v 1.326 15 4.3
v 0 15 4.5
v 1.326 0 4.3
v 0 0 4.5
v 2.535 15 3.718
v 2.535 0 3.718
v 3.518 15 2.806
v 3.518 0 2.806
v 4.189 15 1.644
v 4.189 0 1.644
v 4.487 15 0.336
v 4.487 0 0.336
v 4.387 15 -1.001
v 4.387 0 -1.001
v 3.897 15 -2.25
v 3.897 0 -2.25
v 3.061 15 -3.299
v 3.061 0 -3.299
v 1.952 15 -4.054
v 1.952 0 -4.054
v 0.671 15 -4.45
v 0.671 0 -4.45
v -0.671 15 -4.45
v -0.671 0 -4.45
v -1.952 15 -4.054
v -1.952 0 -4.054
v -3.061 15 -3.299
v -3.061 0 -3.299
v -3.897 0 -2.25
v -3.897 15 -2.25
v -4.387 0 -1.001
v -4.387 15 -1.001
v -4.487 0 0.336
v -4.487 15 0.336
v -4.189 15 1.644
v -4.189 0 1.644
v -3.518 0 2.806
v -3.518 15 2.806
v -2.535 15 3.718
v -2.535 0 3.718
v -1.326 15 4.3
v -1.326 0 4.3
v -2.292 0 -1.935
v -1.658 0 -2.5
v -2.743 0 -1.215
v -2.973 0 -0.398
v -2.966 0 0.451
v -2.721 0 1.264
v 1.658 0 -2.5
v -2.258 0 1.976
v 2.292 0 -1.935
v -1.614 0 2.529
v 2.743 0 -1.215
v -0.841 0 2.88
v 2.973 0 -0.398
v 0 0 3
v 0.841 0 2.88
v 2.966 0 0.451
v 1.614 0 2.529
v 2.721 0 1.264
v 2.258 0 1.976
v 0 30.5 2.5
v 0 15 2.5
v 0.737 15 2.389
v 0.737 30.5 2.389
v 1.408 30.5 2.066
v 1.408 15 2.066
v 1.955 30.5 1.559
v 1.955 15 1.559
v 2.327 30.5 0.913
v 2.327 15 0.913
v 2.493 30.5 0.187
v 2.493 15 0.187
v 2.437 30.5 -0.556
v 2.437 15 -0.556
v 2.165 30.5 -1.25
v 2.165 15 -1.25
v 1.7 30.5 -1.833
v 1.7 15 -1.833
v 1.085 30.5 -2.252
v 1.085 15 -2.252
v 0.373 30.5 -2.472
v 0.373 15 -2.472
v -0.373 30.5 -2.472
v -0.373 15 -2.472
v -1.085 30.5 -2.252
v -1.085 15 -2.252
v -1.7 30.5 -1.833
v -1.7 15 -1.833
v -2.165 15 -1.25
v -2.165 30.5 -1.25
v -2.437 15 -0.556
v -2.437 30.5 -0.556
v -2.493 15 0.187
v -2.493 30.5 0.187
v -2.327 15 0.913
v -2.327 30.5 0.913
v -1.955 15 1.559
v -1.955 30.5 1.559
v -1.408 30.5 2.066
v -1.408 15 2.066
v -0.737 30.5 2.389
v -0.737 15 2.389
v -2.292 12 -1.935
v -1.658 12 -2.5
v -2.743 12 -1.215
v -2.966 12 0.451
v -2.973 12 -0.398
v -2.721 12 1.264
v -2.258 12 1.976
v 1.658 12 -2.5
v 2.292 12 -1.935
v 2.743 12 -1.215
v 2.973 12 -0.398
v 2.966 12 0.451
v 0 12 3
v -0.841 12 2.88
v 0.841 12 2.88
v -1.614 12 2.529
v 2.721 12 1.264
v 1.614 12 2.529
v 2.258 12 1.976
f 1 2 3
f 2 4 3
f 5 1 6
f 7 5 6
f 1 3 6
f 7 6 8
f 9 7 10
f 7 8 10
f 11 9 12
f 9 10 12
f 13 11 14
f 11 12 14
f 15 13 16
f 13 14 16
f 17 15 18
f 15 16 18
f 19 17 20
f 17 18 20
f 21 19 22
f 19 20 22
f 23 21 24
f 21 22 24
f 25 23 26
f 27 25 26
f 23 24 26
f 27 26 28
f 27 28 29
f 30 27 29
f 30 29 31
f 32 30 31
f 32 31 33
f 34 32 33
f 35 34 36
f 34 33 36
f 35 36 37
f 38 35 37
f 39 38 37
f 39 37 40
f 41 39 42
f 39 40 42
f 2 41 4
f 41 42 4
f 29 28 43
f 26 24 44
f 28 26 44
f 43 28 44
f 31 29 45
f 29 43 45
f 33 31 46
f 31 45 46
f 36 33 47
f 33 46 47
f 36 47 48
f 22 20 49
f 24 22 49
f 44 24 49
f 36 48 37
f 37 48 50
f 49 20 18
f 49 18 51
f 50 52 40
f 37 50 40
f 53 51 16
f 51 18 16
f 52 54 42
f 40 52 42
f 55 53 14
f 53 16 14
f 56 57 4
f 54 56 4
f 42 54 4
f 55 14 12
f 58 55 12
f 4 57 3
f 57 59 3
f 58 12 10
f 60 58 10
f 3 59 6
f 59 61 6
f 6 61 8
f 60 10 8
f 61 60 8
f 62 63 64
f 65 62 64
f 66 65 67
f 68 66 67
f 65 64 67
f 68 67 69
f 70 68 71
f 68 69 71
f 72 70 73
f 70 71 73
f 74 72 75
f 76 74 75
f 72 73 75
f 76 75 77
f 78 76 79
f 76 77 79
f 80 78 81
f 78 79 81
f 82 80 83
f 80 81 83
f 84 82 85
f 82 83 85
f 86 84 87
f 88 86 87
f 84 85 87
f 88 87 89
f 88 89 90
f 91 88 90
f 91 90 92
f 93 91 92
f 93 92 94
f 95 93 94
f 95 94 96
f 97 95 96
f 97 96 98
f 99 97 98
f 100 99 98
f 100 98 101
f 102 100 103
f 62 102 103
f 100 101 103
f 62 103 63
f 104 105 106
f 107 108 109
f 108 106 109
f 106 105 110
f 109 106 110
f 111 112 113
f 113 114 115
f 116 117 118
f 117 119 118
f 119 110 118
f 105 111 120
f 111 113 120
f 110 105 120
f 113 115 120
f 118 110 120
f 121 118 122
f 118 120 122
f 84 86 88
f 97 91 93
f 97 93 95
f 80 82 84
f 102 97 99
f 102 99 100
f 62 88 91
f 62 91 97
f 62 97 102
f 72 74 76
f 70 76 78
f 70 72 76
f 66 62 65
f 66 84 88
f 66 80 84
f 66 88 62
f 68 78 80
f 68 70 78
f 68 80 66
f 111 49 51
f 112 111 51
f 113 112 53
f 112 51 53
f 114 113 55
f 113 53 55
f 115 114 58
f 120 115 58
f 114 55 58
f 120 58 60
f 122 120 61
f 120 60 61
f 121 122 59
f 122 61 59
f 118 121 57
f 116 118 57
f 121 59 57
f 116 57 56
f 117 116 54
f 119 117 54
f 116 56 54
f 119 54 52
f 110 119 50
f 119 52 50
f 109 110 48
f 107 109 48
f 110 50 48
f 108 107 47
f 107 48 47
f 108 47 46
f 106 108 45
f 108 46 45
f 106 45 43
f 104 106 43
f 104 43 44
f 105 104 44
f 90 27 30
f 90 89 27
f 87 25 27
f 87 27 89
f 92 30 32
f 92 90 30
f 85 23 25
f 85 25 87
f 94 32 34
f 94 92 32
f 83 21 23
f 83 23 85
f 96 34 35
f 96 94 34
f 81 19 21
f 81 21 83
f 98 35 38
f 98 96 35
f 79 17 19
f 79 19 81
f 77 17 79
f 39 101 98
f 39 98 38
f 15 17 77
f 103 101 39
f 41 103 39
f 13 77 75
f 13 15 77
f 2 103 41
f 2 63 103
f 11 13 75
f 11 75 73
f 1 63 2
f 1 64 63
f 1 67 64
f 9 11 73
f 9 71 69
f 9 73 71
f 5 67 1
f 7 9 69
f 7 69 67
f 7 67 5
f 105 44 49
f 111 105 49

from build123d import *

# Parameters (mm, degrees)
SKETCH2_R           = 4.5
BOSS_EXTRUDE1_DEPTH = 12
SKETCH3_R           = 4.5
BOSS_EXTRUDE2_DEPTH = 3
SKETCH4_R           = 2.5
BOSS_EXTRUDE3_DEPTH = 15.5


with BuildPart() as part:
    # Sketch2 → Boss-Extrude1 (new body)
    with BuildSketch(Plane(origin=(0, 0, 0), x_dir=(1, 0, 0), z_dir=(0, 1, 0))):
        with Locations(Location((0, 0, 0), (0, 0, 270))):
            Circle(SKETCH2_R)
        with BuildLine():
            ThreePointArc((1.658312395, 2.5), (0, -3), (-1.658312395, 2.5))
            Line((-1.658312395, 2.5), (1.658312395, 2.5))
        make_face(mode=Mode.SUBTRACT)
    extrude(amount=BOSS_EXTRUDE1_DEPTH)

    # Sketch3 → Boss-Extrude2 (add)
    with BuildSketch(Plane(origin=(0, 12, 0), x_dir=(1, 0, 0), z_dir=(0, 1, 0))):
        with Locations(Location((0, 0, 0), (0, 0, 270))):
            Circle(SKETCH3_R)
    extrude(amount=BOSS_EXTRUDE2_DEPTH)

    # Sketch4 → Boss-Extrude3 (add)
    with BuildSketch(Plane(origin=(0, 15, 0), x_dir=(1, 0, 0), z_dir=(0, 1, 0))):
        with Locations(Location((0, 0, 0), (0, 0, 270))):
            Circle(SKETCH4_R)
    extrude(amount=BOSS_EXTRUDE3_DEPTH)


solid = part.part
